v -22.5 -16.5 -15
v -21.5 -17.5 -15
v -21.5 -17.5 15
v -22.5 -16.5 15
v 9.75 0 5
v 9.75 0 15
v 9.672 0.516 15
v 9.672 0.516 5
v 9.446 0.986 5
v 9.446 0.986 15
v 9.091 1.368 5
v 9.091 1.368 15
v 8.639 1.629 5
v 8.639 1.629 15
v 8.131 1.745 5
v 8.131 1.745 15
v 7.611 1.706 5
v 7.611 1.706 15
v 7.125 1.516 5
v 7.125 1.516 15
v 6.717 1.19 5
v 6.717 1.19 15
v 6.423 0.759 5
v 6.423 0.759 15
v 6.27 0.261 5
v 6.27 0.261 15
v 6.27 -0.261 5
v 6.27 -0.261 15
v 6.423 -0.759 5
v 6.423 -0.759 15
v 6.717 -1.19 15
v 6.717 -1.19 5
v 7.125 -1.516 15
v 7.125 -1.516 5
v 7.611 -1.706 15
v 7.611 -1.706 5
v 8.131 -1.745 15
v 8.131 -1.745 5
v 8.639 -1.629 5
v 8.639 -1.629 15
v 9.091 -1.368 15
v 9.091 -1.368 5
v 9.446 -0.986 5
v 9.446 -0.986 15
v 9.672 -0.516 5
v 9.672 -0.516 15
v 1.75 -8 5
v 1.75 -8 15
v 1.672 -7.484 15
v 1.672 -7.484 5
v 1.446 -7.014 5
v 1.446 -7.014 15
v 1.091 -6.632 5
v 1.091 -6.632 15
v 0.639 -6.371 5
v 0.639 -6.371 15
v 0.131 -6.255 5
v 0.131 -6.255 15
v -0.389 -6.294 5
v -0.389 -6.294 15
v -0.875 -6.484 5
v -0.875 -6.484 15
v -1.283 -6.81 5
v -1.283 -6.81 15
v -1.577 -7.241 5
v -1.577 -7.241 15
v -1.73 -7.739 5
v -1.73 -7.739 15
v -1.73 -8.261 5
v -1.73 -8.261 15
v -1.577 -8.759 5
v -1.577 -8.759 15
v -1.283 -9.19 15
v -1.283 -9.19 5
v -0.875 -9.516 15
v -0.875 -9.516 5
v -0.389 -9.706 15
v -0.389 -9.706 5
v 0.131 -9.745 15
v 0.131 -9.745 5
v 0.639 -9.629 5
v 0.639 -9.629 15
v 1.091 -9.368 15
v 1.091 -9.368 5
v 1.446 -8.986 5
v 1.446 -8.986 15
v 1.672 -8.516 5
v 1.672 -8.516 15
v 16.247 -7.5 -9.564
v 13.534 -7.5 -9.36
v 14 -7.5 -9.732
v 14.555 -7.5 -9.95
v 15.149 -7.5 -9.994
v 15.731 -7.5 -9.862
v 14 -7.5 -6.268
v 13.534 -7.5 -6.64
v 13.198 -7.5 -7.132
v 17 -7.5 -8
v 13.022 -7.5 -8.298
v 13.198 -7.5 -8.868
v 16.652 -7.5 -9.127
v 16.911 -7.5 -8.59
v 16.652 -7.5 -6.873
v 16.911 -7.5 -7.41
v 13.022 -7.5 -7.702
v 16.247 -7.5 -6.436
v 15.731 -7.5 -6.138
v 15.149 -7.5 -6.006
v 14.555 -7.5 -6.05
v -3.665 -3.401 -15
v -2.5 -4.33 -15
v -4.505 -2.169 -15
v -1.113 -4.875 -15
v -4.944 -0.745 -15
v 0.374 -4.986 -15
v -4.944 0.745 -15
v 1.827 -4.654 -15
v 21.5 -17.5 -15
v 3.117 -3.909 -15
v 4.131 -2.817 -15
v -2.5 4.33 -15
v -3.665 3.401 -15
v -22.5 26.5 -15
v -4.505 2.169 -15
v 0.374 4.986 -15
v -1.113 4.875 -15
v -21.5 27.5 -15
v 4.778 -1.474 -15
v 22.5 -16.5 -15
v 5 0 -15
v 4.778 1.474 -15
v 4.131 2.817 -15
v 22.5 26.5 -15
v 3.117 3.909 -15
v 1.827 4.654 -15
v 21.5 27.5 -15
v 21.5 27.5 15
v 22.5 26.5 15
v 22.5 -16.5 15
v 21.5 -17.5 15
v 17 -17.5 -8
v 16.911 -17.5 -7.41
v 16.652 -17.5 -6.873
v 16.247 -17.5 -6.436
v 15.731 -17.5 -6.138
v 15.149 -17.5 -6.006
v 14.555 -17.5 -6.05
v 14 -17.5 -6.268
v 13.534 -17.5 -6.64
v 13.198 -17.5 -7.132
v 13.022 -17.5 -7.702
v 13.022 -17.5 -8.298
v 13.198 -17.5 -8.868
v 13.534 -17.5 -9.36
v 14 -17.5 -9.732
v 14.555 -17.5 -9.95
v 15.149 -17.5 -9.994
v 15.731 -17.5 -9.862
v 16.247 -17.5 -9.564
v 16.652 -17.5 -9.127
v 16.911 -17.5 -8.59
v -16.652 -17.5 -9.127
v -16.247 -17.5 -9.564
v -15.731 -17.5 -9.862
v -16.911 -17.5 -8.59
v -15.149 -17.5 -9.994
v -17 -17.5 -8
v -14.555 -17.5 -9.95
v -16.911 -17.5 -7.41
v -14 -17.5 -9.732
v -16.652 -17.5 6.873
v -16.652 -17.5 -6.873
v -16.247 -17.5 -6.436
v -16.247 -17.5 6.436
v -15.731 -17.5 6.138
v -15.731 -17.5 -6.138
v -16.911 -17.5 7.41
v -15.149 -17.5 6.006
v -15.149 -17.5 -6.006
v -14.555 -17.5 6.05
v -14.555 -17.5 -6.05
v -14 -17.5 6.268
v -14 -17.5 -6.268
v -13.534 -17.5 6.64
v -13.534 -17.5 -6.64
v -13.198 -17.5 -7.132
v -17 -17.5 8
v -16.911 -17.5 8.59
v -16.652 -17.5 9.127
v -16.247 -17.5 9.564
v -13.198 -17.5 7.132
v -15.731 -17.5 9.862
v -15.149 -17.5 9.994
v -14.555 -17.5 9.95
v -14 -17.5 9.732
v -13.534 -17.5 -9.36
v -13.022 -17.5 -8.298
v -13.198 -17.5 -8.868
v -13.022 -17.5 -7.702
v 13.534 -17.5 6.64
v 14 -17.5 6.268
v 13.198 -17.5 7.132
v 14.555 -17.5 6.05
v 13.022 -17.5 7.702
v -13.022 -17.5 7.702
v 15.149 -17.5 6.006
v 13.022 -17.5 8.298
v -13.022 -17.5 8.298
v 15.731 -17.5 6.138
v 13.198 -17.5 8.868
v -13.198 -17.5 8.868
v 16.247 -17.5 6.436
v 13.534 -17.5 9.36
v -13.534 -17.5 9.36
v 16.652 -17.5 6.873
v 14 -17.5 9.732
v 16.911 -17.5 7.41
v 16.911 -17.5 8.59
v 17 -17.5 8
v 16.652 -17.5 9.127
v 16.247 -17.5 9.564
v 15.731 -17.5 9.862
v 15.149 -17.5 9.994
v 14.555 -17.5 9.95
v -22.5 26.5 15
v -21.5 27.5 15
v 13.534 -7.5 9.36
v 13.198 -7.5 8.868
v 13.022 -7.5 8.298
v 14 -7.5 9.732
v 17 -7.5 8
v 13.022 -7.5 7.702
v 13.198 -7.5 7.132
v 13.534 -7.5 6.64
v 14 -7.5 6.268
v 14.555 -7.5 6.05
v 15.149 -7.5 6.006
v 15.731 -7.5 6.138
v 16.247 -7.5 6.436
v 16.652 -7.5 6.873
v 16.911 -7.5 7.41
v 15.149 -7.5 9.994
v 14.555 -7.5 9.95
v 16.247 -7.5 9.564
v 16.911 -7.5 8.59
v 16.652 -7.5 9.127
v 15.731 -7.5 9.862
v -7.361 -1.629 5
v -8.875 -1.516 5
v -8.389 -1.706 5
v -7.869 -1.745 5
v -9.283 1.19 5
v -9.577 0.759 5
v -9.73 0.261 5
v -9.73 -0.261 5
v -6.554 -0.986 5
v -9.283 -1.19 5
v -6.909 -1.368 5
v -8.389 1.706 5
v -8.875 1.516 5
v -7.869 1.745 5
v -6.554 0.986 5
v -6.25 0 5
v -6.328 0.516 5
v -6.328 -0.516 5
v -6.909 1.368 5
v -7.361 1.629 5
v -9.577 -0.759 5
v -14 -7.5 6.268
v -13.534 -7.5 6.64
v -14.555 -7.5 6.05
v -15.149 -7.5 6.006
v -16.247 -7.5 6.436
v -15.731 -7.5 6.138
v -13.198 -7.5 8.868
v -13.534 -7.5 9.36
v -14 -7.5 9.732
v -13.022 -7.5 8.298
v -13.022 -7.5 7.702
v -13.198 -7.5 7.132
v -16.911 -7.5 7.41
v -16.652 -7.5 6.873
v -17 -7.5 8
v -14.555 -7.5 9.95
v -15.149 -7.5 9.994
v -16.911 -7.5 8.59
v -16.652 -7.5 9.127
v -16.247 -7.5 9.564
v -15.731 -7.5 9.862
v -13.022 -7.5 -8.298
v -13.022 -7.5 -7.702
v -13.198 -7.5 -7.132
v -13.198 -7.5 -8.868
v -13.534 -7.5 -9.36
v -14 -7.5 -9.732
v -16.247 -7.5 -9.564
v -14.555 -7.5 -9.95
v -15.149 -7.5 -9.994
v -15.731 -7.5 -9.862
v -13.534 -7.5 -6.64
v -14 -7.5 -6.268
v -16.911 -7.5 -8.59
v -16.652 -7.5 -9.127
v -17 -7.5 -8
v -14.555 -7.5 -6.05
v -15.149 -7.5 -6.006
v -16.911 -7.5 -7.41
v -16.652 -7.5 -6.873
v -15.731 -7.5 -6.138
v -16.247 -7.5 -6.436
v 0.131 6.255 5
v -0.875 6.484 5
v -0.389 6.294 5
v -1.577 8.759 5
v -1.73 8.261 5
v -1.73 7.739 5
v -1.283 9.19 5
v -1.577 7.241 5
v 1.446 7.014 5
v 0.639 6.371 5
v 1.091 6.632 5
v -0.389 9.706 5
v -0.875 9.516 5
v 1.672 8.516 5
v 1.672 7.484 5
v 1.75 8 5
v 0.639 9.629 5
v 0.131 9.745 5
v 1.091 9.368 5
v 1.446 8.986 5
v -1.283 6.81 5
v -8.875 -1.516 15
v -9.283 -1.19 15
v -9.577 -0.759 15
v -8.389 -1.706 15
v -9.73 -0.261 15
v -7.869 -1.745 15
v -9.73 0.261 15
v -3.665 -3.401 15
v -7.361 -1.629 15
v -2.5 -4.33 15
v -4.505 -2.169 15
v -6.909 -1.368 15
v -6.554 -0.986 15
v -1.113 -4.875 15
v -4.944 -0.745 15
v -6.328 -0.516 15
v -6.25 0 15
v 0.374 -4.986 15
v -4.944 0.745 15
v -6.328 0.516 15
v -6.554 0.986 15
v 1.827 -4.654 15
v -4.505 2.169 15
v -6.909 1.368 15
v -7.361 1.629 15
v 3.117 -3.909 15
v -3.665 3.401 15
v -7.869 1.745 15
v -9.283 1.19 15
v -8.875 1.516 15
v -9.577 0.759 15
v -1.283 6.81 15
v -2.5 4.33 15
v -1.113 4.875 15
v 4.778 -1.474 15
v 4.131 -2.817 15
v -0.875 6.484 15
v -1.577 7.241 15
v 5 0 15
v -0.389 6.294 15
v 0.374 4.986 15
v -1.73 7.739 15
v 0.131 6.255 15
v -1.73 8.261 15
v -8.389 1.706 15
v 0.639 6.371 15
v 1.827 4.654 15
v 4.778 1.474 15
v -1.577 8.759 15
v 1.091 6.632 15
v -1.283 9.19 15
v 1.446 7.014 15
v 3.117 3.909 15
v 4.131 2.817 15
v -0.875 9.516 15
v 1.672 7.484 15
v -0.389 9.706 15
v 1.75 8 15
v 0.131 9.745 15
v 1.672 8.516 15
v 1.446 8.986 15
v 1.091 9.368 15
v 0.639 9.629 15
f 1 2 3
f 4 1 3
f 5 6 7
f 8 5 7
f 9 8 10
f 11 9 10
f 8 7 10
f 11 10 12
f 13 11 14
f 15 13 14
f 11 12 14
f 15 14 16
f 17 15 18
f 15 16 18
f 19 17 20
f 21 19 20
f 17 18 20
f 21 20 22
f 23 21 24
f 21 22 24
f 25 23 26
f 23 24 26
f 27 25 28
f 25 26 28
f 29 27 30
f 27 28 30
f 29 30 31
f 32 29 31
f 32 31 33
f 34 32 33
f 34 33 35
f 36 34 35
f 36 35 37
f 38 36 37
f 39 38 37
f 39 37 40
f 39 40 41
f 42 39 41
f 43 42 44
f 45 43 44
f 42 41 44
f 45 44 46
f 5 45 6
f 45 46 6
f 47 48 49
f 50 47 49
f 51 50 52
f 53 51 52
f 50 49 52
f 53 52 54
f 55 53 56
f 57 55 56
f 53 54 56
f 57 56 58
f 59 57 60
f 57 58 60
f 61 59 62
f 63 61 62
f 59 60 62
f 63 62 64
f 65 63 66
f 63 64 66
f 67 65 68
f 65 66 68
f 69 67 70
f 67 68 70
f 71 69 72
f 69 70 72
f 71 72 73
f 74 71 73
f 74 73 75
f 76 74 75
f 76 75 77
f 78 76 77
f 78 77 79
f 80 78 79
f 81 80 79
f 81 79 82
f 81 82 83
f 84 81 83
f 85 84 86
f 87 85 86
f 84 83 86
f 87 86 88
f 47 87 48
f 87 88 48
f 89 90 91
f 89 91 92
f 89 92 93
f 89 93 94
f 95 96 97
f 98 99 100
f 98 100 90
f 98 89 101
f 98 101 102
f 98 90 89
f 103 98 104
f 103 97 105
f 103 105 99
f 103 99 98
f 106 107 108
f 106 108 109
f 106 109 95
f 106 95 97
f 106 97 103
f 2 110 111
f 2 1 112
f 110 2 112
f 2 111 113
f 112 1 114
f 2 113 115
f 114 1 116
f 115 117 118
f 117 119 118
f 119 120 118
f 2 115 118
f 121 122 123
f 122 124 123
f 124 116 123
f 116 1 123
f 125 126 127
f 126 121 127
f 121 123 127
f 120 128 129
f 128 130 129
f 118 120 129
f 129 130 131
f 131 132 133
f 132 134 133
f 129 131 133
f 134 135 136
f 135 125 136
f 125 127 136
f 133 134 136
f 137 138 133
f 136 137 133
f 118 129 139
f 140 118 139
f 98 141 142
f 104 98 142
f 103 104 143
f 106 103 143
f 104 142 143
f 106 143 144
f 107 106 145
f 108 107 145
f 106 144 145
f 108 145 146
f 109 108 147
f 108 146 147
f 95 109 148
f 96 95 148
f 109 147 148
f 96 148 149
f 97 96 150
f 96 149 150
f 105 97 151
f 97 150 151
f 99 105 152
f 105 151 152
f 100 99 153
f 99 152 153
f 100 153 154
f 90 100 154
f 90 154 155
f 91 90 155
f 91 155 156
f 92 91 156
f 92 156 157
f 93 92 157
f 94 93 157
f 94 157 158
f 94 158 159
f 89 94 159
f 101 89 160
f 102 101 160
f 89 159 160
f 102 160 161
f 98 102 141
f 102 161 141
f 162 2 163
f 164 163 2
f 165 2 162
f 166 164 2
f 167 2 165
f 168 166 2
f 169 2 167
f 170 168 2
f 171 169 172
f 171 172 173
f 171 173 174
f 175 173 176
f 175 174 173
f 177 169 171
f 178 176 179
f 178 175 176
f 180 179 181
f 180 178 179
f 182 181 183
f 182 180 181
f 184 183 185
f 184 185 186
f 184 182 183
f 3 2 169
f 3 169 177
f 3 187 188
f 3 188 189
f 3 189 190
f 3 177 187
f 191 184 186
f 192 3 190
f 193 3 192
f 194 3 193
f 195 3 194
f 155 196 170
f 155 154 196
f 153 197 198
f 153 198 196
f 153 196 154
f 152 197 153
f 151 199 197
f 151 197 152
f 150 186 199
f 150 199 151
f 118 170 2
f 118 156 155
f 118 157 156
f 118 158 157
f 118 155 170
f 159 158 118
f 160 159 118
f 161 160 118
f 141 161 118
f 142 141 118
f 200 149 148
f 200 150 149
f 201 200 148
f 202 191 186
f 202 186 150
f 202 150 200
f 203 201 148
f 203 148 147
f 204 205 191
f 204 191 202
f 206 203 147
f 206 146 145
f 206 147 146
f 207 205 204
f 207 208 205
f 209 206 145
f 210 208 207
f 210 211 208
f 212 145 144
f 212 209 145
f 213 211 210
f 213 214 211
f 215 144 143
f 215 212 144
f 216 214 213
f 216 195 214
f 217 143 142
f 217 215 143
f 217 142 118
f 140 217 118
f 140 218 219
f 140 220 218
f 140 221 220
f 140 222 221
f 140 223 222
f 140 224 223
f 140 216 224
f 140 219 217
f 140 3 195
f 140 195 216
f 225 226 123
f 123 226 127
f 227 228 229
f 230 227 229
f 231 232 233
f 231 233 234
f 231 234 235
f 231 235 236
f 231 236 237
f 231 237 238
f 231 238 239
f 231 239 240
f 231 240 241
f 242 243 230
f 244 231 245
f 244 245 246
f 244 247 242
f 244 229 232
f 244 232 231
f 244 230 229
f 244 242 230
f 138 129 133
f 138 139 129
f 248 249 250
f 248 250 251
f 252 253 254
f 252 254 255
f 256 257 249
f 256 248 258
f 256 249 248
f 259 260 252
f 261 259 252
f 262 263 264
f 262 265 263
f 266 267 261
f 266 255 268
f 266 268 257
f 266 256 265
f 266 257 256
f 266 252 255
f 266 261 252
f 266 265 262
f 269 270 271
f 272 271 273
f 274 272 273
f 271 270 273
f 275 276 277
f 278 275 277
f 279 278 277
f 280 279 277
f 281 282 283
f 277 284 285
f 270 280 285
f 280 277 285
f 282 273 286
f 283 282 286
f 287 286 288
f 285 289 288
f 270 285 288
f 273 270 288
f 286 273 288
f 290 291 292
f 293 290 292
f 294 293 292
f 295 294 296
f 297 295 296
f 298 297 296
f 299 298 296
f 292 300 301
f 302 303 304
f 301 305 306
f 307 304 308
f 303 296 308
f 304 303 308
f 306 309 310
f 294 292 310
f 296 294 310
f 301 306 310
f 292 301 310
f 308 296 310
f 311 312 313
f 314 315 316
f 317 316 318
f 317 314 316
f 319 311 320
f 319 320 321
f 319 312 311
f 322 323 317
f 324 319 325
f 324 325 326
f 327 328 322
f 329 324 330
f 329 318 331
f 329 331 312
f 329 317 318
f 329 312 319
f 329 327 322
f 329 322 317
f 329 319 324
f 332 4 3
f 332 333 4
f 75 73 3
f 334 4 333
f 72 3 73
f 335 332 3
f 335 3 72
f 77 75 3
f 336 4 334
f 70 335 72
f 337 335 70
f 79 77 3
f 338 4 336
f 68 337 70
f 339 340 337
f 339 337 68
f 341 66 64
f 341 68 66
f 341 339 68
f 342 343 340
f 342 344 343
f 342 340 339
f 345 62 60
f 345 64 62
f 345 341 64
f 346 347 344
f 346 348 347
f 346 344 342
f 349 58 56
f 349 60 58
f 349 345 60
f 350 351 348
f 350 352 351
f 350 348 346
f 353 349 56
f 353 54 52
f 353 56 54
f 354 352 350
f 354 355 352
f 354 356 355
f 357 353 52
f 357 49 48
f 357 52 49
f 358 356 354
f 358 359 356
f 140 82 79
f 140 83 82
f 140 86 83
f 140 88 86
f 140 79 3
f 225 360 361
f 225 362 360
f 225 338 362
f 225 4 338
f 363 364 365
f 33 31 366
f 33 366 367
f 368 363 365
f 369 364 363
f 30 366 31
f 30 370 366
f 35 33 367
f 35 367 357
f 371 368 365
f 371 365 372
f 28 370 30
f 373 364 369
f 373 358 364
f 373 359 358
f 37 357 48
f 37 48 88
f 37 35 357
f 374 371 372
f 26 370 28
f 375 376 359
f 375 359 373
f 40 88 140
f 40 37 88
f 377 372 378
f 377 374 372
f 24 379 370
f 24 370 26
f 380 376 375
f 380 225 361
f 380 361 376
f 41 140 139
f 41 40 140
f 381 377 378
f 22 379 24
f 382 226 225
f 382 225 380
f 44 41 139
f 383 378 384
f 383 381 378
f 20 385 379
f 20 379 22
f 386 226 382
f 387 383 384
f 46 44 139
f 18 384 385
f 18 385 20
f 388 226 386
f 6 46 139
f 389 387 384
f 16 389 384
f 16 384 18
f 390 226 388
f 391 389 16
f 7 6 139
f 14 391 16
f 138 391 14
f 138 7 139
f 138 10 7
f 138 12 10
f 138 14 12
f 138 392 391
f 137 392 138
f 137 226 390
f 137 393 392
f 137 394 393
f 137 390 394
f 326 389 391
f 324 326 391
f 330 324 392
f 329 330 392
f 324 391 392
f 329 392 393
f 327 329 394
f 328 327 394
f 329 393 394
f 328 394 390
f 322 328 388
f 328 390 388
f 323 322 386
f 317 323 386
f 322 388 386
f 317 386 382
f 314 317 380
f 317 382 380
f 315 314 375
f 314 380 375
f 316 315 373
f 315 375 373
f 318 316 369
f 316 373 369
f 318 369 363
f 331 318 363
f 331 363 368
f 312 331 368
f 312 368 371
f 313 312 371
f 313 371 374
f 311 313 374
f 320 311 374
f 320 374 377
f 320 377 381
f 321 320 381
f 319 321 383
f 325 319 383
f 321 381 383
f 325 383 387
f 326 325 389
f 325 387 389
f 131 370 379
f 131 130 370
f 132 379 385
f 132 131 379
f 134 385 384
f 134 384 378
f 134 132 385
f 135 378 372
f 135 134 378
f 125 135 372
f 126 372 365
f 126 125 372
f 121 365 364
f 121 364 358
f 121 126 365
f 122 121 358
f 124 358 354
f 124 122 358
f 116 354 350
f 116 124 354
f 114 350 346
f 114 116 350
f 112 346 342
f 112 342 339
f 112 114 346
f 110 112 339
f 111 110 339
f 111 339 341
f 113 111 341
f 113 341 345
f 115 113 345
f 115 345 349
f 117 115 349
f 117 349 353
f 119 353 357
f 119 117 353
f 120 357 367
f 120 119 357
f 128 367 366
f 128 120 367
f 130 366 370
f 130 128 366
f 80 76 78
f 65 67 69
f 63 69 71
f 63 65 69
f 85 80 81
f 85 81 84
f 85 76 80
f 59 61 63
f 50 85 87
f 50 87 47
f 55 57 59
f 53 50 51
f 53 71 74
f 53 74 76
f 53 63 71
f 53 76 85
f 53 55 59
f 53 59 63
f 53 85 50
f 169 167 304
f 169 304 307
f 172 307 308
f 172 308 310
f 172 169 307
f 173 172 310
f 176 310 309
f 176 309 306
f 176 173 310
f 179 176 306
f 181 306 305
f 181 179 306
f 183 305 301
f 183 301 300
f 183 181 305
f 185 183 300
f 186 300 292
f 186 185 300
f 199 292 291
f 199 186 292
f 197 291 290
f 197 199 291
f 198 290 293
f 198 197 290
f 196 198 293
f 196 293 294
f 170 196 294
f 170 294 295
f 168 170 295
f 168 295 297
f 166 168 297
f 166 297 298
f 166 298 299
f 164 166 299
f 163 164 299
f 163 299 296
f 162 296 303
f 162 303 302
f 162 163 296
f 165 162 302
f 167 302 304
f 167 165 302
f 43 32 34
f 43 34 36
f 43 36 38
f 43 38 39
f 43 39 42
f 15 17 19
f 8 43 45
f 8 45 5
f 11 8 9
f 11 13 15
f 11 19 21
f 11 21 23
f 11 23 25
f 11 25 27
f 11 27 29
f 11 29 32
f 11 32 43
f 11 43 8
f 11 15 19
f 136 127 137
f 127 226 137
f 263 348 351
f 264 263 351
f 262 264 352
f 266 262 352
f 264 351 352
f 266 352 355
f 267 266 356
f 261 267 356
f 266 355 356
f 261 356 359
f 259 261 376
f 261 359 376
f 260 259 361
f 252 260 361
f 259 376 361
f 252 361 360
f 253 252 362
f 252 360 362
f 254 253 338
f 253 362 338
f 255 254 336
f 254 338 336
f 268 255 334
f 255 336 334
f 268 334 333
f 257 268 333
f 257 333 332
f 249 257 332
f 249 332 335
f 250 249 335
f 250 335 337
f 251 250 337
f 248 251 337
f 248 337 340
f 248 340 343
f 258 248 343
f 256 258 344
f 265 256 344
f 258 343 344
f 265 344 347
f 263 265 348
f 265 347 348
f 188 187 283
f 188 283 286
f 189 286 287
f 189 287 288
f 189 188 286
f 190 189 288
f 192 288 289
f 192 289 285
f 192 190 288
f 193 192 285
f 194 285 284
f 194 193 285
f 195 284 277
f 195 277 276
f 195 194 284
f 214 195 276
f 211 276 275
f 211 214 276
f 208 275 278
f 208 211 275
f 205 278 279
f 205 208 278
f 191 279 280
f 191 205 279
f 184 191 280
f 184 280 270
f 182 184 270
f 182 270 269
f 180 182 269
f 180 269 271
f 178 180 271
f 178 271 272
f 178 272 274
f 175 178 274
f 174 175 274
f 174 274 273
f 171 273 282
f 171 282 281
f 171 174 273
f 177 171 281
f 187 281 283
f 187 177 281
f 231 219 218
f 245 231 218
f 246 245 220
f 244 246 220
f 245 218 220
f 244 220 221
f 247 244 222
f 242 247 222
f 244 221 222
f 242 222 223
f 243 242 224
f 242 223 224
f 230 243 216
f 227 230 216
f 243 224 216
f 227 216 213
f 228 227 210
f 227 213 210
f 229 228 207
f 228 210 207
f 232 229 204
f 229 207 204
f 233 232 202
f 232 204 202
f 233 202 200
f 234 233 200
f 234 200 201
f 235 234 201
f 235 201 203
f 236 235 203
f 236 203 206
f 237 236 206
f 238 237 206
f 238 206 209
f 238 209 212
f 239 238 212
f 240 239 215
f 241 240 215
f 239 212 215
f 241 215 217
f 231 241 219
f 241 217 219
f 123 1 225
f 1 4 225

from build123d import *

# Parameters (mm, degrees)
SKETCH1_W           = 45
SKETCH1_H           = 45
SKETCH1_R           = 5
BOSS_EXTRUDE1_DEPTH = 15
SKETCH2_R           = 1.75
CUT_EXTRUDE1_DEPTH  = 10
CHAMFER1_SIZE       = 1
SKETCH3_R           = 2
CUT_EXTRUDE2_DEPTH  = 10


with BuildPart() as part:
    # Sketch1 → Boss-Extrude1 (new body, symmetric)
    with BuildSketch(Plane.XY):
        with Locations((0, 5)):
            Rectangle(SKETCH1_W, SKETCH1_H)
        Circle(SKETCH1_R, mode=Mode.SUBTRACT)
    extrude(amount=BOSS_EXTRUDE1_DEPTH, both=True)

    # Sketch2 → Cut-Extrude1 (cut)
    with BuildSketch(Plane.XY.offset(15)):
        with Locations((0, 8)):
            Circle(SKETCH2_R)
        with Locations((0, -8)):
            Circle(SKETCH2_R)
        with Locations((8, 0)):
            Circle(SKETCH2_R)
        with Locations((-8, 0)):
            Circle(SKETCH2_R)
    extrude(amount=-CUT_EXTRUDE1_DEPTH, mode=Mode.SUBTRACT)

    # Chamfer1
    chamfer1_edges = [part.edges().sort_by_distance(p)[0] for p in [
        (-22.5, 27.5, 0),
        (22.5, 27.5, 0),
        (22.5, -17.5, 0),
        (-22.5, -17.5, 0),
    ]]
    chamfer(chamfer1_edges, length=CHAMFER1_SIZE)

    # Sketch3 → Cut-Extrude2 (cut)
    with BuildSketch(Plane.XZ.offset(17.5)):
        with Locations((15, 8)):
            Circle(SKETCH3_R)
        with Locations((15, -8)):
            Circle(SKETCH3_R)
    cut_extrude2 = extrude(amount=-CUT_EXTRUDE2_DEPTH, mode=Mode.SUBTRACT)

    # Mirror1: Cut-Extrude2 across plane
    add(cut_extrude2.mirror(Plane(origin=(0, 0, 0), x_dir=(0, 0, 1), z_dir=(1, 0, 0))), mode=Mode.SUBTRACT)


solid = part.part
